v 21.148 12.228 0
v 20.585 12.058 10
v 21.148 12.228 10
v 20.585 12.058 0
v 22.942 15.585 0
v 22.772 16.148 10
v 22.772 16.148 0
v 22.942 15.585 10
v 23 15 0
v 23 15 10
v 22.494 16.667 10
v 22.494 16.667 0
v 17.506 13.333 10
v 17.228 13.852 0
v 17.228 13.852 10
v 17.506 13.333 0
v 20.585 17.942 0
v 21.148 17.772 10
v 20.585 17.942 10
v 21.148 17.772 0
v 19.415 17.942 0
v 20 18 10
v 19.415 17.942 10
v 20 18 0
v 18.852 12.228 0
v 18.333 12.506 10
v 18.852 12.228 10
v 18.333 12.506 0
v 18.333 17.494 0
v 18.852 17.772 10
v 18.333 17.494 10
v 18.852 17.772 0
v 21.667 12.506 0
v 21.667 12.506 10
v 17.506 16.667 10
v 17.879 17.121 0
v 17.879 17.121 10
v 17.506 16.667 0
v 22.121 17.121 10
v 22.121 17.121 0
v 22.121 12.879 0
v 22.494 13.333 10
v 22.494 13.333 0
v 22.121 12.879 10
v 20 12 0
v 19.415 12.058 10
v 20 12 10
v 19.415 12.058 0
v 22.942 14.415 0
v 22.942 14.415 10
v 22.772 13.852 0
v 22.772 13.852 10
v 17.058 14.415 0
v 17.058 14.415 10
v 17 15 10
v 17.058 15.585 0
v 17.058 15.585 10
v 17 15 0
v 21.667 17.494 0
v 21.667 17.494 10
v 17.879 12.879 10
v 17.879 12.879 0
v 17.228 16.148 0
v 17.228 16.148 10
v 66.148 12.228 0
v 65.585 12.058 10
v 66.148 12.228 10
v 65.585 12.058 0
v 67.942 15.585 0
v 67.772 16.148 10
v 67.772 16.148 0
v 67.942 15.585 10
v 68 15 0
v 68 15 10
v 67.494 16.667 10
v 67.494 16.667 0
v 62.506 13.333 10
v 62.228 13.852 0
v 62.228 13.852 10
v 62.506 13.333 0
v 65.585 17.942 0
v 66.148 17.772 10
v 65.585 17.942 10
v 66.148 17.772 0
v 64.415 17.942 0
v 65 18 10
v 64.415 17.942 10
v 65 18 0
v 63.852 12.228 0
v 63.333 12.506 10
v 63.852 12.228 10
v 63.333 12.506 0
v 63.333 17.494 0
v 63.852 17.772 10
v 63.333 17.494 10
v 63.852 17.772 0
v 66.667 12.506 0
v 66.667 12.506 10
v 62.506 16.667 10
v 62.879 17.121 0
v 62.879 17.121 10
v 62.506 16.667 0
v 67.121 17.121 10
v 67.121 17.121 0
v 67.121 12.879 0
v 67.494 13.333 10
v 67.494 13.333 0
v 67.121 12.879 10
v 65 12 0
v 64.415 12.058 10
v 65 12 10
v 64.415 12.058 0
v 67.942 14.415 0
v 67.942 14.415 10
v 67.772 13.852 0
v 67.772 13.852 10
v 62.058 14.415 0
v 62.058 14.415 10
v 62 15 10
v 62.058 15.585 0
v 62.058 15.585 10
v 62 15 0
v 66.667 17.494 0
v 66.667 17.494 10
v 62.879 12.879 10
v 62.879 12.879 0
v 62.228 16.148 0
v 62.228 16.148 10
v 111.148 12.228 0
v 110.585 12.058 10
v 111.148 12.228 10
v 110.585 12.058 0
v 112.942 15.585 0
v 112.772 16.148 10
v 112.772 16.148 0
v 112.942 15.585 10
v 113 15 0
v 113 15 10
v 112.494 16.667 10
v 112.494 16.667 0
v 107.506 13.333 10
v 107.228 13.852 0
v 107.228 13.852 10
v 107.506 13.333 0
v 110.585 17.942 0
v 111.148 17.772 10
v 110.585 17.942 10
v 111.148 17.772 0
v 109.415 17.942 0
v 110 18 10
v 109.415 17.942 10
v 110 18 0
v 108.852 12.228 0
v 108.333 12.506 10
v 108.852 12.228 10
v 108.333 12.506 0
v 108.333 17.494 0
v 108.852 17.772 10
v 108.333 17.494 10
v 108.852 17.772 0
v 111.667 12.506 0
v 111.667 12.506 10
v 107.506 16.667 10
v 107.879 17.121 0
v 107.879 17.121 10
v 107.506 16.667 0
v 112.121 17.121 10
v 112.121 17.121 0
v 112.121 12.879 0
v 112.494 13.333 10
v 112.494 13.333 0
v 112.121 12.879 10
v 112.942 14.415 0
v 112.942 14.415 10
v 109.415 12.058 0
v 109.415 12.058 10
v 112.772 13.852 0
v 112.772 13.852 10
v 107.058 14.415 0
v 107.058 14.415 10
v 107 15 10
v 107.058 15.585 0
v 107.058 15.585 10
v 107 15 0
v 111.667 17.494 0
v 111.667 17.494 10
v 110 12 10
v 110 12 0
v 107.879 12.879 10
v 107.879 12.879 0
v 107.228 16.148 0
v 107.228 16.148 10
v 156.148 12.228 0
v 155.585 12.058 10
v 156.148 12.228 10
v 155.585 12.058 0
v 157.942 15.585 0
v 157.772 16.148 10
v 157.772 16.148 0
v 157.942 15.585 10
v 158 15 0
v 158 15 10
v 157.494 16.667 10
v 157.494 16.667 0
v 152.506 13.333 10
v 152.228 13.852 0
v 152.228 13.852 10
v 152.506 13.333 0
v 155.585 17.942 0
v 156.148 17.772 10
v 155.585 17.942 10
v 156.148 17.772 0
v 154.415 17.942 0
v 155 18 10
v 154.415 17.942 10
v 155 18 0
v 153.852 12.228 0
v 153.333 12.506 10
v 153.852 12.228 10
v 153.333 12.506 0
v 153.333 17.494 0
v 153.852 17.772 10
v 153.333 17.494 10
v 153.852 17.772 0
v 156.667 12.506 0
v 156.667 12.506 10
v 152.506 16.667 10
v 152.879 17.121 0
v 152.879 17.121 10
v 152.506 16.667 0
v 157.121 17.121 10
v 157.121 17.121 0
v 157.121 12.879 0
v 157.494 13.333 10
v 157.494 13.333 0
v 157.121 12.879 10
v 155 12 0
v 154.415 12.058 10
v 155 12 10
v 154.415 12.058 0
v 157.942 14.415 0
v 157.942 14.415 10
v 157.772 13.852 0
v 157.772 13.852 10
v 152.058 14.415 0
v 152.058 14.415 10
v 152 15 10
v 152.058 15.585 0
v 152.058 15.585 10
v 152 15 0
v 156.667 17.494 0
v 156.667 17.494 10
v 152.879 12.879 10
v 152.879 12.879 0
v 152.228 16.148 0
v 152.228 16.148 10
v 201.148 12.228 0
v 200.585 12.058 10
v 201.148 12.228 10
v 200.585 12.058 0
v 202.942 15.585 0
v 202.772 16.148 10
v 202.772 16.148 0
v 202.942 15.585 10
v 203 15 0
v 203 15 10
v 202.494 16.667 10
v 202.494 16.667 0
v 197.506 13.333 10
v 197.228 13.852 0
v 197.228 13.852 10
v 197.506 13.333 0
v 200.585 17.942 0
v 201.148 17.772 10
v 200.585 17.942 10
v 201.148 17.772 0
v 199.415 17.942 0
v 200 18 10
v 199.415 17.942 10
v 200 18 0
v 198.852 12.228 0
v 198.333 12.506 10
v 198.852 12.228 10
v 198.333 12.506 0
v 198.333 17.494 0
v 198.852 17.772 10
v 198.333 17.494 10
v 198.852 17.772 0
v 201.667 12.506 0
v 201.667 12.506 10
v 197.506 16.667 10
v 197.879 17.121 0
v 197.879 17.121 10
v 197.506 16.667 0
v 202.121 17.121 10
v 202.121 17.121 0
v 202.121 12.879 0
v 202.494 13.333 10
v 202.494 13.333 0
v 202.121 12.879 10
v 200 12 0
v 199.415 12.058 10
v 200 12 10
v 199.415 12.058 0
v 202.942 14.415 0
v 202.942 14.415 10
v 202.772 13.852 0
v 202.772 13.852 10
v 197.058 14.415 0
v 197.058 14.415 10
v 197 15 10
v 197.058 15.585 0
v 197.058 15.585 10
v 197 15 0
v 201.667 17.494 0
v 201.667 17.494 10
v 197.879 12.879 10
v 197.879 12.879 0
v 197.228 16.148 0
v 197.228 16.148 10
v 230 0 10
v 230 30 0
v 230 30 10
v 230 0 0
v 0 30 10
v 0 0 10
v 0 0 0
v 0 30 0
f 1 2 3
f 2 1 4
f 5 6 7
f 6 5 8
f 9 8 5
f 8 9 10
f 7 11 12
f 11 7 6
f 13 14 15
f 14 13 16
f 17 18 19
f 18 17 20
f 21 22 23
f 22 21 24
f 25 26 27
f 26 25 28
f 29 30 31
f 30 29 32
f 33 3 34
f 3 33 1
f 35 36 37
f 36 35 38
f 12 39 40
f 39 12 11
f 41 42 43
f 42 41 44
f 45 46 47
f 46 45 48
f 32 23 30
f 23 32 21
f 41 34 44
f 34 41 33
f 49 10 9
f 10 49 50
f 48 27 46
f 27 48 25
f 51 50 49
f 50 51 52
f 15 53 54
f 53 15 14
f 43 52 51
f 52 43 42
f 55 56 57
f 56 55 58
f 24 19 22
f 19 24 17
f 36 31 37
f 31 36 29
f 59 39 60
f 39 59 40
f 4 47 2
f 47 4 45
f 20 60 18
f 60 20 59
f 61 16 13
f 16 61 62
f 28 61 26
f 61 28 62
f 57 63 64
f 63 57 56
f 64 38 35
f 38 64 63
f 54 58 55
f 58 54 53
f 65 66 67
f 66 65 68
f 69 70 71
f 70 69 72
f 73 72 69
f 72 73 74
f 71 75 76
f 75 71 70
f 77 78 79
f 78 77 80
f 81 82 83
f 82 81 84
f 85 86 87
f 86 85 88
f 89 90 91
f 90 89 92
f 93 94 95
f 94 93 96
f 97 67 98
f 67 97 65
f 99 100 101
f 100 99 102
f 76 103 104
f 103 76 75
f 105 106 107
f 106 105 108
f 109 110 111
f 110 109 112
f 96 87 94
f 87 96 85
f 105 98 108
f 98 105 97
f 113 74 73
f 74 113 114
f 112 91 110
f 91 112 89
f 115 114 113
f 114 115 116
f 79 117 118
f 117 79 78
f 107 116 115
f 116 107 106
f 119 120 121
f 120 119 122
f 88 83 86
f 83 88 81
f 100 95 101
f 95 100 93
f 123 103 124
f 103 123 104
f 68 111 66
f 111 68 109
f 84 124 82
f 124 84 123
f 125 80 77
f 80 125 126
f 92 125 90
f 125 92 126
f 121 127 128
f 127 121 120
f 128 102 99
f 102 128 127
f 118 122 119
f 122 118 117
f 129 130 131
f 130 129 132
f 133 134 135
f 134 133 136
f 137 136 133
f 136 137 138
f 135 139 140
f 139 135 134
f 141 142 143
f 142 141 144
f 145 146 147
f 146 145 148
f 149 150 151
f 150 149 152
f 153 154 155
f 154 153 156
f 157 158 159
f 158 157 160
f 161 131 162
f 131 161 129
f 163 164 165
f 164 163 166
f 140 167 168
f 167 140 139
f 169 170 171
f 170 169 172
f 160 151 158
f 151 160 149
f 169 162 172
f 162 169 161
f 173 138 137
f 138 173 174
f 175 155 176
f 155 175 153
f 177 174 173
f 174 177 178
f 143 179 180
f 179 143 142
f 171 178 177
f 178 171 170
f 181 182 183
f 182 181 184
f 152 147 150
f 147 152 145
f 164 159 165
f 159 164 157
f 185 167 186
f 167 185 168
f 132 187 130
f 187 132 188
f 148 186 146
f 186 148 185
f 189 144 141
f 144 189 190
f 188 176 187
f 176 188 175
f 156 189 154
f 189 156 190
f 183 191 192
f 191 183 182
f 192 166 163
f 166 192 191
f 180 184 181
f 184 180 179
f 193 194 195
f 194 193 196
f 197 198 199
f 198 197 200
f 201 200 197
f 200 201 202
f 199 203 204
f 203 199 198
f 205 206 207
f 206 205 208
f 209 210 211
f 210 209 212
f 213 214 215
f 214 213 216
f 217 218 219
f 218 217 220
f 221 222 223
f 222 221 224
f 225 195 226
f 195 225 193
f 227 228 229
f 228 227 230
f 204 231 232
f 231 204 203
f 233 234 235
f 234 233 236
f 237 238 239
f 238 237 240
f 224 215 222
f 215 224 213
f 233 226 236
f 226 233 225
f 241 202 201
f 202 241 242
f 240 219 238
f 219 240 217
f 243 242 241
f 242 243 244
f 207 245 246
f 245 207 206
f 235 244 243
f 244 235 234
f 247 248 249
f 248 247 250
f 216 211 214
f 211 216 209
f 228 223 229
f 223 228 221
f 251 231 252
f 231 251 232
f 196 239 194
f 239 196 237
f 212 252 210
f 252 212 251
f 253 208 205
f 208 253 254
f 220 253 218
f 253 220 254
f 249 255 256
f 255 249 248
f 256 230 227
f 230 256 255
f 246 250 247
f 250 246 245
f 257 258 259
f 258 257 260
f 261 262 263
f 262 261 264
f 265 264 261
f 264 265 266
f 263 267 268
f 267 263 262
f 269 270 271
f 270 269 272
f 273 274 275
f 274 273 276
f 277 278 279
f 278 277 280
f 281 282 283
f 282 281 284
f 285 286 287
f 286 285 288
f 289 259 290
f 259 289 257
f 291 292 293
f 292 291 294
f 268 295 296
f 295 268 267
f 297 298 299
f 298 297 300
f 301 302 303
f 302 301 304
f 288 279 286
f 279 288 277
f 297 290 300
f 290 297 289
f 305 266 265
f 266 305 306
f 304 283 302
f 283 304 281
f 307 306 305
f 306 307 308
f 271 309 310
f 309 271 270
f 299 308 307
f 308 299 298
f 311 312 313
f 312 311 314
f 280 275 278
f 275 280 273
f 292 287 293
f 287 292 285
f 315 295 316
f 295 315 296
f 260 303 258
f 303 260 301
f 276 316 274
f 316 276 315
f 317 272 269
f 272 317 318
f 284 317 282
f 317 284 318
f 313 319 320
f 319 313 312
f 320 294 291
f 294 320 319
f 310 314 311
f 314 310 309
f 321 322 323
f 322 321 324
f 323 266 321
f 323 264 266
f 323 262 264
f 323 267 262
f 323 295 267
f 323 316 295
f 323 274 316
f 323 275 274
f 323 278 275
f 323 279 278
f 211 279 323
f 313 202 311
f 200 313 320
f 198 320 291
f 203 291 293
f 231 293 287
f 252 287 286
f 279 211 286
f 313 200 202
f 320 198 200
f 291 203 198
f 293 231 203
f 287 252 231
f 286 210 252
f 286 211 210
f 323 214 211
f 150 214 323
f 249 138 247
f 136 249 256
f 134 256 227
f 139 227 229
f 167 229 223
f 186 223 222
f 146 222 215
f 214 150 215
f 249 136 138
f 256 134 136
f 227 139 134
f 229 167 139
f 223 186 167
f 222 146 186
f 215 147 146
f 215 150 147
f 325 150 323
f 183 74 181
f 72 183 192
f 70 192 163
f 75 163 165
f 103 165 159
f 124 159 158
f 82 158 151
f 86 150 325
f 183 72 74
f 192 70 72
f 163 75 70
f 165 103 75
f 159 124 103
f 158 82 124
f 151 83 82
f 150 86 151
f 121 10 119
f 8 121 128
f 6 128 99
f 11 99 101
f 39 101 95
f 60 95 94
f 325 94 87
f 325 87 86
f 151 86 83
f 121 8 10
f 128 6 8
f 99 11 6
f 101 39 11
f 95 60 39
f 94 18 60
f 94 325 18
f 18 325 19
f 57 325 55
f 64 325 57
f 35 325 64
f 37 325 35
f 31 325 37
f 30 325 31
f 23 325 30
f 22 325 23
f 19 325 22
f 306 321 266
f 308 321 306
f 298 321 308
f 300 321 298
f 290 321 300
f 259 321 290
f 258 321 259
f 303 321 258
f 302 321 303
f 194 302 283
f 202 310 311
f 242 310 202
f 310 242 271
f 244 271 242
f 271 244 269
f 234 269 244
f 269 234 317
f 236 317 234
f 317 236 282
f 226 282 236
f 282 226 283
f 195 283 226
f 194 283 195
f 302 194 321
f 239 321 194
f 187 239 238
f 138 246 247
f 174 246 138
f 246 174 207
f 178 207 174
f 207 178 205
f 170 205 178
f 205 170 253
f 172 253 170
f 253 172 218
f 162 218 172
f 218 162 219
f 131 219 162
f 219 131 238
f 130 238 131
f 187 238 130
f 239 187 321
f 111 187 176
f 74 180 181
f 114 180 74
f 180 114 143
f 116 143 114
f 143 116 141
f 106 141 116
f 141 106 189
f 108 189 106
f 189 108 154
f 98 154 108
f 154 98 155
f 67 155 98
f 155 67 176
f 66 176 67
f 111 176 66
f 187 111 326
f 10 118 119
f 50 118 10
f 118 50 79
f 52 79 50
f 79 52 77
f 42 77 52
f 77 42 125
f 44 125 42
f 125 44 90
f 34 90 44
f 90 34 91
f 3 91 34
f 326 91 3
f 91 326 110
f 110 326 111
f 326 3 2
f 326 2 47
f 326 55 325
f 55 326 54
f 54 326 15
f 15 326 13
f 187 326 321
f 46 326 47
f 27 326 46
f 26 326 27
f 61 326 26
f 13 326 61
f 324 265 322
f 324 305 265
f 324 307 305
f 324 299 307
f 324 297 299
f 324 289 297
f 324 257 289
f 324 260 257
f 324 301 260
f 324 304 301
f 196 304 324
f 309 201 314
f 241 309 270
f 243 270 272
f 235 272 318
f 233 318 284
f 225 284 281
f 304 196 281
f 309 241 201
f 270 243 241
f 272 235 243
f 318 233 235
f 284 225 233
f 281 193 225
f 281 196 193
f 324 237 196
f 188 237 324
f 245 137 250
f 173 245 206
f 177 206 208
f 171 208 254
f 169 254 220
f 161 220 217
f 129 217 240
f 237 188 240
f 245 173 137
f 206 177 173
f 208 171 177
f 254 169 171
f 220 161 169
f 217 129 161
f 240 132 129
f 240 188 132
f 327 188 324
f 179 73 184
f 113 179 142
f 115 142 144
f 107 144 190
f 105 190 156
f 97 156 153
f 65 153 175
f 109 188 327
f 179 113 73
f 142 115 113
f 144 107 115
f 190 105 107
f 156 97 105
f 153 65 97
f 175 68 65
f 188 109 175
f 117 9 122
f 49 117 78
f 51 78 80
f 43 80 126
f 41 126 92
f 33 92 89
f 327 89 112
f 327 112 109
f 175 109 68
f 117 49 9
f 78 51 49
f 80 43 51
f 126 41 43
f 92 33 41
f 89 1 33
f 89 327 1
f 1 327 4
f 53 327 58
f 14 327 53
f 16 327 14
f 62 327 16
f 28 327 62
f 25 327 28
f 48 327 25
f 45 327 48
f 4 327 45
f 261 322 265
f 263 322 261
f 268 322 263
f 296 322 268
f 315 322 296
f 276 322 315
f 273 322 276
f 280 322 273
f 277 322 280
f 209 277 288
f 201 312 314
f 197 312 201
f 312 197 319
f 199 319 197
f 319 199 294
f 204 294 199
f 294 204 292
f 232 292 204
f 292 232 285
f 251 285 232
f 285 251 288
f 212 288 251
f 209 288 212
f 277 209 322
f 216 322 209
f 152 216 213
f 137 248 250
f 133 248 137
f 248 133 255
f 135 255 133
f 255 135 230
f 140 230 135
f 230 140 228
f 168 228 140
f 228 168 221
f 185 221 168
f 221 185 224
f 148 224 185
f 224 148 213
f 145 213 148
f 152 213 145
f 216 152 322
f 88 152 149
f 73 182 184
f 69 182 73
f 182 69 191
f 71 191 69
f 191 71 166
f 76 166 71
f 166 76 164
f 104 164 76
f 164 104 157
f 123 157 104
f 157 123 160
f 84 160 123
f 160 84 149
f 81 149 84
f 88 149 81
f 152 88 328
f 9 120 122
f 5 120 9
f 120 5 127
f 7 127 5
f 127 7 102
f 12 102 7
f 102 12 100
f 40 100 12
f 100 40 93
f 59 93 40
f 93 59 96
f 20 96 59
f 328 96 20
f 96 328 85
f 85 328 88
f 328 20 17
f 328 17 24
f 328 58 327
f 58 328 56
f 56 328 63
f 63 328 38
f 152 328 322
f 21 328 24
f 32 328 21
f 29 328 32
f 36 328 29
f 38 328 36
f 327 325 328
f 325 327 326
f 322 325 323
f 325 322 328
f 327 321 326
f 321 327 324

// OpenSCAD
$fn = 32;

// ----------------------------------------------------------------------
// Long rail: 200-250 mm mounting rail
// ----------------------------------------------------------------------

// --- parameters (mm) ---
rail_l = 230;             // rail length, X
rail_w = 30;              // rail width, Y
rail_t = 10;              // rail thickness, Z
hole_d = 6;               // mounting hole diameter
hole_start = 20;          // first hole offset from the end
hole_pitch = 45;          // hole pitch
holes = 5;                // number of holes

difference() {
  cube([rail_l, rail_w, rail_t]);
  for (i = [0 : holes - 1])
    translate([hole_start + i * hole_pitch, rail_w / 2, -1])
      cylinder(h = rail_t + 2, d = hole_d);
}
